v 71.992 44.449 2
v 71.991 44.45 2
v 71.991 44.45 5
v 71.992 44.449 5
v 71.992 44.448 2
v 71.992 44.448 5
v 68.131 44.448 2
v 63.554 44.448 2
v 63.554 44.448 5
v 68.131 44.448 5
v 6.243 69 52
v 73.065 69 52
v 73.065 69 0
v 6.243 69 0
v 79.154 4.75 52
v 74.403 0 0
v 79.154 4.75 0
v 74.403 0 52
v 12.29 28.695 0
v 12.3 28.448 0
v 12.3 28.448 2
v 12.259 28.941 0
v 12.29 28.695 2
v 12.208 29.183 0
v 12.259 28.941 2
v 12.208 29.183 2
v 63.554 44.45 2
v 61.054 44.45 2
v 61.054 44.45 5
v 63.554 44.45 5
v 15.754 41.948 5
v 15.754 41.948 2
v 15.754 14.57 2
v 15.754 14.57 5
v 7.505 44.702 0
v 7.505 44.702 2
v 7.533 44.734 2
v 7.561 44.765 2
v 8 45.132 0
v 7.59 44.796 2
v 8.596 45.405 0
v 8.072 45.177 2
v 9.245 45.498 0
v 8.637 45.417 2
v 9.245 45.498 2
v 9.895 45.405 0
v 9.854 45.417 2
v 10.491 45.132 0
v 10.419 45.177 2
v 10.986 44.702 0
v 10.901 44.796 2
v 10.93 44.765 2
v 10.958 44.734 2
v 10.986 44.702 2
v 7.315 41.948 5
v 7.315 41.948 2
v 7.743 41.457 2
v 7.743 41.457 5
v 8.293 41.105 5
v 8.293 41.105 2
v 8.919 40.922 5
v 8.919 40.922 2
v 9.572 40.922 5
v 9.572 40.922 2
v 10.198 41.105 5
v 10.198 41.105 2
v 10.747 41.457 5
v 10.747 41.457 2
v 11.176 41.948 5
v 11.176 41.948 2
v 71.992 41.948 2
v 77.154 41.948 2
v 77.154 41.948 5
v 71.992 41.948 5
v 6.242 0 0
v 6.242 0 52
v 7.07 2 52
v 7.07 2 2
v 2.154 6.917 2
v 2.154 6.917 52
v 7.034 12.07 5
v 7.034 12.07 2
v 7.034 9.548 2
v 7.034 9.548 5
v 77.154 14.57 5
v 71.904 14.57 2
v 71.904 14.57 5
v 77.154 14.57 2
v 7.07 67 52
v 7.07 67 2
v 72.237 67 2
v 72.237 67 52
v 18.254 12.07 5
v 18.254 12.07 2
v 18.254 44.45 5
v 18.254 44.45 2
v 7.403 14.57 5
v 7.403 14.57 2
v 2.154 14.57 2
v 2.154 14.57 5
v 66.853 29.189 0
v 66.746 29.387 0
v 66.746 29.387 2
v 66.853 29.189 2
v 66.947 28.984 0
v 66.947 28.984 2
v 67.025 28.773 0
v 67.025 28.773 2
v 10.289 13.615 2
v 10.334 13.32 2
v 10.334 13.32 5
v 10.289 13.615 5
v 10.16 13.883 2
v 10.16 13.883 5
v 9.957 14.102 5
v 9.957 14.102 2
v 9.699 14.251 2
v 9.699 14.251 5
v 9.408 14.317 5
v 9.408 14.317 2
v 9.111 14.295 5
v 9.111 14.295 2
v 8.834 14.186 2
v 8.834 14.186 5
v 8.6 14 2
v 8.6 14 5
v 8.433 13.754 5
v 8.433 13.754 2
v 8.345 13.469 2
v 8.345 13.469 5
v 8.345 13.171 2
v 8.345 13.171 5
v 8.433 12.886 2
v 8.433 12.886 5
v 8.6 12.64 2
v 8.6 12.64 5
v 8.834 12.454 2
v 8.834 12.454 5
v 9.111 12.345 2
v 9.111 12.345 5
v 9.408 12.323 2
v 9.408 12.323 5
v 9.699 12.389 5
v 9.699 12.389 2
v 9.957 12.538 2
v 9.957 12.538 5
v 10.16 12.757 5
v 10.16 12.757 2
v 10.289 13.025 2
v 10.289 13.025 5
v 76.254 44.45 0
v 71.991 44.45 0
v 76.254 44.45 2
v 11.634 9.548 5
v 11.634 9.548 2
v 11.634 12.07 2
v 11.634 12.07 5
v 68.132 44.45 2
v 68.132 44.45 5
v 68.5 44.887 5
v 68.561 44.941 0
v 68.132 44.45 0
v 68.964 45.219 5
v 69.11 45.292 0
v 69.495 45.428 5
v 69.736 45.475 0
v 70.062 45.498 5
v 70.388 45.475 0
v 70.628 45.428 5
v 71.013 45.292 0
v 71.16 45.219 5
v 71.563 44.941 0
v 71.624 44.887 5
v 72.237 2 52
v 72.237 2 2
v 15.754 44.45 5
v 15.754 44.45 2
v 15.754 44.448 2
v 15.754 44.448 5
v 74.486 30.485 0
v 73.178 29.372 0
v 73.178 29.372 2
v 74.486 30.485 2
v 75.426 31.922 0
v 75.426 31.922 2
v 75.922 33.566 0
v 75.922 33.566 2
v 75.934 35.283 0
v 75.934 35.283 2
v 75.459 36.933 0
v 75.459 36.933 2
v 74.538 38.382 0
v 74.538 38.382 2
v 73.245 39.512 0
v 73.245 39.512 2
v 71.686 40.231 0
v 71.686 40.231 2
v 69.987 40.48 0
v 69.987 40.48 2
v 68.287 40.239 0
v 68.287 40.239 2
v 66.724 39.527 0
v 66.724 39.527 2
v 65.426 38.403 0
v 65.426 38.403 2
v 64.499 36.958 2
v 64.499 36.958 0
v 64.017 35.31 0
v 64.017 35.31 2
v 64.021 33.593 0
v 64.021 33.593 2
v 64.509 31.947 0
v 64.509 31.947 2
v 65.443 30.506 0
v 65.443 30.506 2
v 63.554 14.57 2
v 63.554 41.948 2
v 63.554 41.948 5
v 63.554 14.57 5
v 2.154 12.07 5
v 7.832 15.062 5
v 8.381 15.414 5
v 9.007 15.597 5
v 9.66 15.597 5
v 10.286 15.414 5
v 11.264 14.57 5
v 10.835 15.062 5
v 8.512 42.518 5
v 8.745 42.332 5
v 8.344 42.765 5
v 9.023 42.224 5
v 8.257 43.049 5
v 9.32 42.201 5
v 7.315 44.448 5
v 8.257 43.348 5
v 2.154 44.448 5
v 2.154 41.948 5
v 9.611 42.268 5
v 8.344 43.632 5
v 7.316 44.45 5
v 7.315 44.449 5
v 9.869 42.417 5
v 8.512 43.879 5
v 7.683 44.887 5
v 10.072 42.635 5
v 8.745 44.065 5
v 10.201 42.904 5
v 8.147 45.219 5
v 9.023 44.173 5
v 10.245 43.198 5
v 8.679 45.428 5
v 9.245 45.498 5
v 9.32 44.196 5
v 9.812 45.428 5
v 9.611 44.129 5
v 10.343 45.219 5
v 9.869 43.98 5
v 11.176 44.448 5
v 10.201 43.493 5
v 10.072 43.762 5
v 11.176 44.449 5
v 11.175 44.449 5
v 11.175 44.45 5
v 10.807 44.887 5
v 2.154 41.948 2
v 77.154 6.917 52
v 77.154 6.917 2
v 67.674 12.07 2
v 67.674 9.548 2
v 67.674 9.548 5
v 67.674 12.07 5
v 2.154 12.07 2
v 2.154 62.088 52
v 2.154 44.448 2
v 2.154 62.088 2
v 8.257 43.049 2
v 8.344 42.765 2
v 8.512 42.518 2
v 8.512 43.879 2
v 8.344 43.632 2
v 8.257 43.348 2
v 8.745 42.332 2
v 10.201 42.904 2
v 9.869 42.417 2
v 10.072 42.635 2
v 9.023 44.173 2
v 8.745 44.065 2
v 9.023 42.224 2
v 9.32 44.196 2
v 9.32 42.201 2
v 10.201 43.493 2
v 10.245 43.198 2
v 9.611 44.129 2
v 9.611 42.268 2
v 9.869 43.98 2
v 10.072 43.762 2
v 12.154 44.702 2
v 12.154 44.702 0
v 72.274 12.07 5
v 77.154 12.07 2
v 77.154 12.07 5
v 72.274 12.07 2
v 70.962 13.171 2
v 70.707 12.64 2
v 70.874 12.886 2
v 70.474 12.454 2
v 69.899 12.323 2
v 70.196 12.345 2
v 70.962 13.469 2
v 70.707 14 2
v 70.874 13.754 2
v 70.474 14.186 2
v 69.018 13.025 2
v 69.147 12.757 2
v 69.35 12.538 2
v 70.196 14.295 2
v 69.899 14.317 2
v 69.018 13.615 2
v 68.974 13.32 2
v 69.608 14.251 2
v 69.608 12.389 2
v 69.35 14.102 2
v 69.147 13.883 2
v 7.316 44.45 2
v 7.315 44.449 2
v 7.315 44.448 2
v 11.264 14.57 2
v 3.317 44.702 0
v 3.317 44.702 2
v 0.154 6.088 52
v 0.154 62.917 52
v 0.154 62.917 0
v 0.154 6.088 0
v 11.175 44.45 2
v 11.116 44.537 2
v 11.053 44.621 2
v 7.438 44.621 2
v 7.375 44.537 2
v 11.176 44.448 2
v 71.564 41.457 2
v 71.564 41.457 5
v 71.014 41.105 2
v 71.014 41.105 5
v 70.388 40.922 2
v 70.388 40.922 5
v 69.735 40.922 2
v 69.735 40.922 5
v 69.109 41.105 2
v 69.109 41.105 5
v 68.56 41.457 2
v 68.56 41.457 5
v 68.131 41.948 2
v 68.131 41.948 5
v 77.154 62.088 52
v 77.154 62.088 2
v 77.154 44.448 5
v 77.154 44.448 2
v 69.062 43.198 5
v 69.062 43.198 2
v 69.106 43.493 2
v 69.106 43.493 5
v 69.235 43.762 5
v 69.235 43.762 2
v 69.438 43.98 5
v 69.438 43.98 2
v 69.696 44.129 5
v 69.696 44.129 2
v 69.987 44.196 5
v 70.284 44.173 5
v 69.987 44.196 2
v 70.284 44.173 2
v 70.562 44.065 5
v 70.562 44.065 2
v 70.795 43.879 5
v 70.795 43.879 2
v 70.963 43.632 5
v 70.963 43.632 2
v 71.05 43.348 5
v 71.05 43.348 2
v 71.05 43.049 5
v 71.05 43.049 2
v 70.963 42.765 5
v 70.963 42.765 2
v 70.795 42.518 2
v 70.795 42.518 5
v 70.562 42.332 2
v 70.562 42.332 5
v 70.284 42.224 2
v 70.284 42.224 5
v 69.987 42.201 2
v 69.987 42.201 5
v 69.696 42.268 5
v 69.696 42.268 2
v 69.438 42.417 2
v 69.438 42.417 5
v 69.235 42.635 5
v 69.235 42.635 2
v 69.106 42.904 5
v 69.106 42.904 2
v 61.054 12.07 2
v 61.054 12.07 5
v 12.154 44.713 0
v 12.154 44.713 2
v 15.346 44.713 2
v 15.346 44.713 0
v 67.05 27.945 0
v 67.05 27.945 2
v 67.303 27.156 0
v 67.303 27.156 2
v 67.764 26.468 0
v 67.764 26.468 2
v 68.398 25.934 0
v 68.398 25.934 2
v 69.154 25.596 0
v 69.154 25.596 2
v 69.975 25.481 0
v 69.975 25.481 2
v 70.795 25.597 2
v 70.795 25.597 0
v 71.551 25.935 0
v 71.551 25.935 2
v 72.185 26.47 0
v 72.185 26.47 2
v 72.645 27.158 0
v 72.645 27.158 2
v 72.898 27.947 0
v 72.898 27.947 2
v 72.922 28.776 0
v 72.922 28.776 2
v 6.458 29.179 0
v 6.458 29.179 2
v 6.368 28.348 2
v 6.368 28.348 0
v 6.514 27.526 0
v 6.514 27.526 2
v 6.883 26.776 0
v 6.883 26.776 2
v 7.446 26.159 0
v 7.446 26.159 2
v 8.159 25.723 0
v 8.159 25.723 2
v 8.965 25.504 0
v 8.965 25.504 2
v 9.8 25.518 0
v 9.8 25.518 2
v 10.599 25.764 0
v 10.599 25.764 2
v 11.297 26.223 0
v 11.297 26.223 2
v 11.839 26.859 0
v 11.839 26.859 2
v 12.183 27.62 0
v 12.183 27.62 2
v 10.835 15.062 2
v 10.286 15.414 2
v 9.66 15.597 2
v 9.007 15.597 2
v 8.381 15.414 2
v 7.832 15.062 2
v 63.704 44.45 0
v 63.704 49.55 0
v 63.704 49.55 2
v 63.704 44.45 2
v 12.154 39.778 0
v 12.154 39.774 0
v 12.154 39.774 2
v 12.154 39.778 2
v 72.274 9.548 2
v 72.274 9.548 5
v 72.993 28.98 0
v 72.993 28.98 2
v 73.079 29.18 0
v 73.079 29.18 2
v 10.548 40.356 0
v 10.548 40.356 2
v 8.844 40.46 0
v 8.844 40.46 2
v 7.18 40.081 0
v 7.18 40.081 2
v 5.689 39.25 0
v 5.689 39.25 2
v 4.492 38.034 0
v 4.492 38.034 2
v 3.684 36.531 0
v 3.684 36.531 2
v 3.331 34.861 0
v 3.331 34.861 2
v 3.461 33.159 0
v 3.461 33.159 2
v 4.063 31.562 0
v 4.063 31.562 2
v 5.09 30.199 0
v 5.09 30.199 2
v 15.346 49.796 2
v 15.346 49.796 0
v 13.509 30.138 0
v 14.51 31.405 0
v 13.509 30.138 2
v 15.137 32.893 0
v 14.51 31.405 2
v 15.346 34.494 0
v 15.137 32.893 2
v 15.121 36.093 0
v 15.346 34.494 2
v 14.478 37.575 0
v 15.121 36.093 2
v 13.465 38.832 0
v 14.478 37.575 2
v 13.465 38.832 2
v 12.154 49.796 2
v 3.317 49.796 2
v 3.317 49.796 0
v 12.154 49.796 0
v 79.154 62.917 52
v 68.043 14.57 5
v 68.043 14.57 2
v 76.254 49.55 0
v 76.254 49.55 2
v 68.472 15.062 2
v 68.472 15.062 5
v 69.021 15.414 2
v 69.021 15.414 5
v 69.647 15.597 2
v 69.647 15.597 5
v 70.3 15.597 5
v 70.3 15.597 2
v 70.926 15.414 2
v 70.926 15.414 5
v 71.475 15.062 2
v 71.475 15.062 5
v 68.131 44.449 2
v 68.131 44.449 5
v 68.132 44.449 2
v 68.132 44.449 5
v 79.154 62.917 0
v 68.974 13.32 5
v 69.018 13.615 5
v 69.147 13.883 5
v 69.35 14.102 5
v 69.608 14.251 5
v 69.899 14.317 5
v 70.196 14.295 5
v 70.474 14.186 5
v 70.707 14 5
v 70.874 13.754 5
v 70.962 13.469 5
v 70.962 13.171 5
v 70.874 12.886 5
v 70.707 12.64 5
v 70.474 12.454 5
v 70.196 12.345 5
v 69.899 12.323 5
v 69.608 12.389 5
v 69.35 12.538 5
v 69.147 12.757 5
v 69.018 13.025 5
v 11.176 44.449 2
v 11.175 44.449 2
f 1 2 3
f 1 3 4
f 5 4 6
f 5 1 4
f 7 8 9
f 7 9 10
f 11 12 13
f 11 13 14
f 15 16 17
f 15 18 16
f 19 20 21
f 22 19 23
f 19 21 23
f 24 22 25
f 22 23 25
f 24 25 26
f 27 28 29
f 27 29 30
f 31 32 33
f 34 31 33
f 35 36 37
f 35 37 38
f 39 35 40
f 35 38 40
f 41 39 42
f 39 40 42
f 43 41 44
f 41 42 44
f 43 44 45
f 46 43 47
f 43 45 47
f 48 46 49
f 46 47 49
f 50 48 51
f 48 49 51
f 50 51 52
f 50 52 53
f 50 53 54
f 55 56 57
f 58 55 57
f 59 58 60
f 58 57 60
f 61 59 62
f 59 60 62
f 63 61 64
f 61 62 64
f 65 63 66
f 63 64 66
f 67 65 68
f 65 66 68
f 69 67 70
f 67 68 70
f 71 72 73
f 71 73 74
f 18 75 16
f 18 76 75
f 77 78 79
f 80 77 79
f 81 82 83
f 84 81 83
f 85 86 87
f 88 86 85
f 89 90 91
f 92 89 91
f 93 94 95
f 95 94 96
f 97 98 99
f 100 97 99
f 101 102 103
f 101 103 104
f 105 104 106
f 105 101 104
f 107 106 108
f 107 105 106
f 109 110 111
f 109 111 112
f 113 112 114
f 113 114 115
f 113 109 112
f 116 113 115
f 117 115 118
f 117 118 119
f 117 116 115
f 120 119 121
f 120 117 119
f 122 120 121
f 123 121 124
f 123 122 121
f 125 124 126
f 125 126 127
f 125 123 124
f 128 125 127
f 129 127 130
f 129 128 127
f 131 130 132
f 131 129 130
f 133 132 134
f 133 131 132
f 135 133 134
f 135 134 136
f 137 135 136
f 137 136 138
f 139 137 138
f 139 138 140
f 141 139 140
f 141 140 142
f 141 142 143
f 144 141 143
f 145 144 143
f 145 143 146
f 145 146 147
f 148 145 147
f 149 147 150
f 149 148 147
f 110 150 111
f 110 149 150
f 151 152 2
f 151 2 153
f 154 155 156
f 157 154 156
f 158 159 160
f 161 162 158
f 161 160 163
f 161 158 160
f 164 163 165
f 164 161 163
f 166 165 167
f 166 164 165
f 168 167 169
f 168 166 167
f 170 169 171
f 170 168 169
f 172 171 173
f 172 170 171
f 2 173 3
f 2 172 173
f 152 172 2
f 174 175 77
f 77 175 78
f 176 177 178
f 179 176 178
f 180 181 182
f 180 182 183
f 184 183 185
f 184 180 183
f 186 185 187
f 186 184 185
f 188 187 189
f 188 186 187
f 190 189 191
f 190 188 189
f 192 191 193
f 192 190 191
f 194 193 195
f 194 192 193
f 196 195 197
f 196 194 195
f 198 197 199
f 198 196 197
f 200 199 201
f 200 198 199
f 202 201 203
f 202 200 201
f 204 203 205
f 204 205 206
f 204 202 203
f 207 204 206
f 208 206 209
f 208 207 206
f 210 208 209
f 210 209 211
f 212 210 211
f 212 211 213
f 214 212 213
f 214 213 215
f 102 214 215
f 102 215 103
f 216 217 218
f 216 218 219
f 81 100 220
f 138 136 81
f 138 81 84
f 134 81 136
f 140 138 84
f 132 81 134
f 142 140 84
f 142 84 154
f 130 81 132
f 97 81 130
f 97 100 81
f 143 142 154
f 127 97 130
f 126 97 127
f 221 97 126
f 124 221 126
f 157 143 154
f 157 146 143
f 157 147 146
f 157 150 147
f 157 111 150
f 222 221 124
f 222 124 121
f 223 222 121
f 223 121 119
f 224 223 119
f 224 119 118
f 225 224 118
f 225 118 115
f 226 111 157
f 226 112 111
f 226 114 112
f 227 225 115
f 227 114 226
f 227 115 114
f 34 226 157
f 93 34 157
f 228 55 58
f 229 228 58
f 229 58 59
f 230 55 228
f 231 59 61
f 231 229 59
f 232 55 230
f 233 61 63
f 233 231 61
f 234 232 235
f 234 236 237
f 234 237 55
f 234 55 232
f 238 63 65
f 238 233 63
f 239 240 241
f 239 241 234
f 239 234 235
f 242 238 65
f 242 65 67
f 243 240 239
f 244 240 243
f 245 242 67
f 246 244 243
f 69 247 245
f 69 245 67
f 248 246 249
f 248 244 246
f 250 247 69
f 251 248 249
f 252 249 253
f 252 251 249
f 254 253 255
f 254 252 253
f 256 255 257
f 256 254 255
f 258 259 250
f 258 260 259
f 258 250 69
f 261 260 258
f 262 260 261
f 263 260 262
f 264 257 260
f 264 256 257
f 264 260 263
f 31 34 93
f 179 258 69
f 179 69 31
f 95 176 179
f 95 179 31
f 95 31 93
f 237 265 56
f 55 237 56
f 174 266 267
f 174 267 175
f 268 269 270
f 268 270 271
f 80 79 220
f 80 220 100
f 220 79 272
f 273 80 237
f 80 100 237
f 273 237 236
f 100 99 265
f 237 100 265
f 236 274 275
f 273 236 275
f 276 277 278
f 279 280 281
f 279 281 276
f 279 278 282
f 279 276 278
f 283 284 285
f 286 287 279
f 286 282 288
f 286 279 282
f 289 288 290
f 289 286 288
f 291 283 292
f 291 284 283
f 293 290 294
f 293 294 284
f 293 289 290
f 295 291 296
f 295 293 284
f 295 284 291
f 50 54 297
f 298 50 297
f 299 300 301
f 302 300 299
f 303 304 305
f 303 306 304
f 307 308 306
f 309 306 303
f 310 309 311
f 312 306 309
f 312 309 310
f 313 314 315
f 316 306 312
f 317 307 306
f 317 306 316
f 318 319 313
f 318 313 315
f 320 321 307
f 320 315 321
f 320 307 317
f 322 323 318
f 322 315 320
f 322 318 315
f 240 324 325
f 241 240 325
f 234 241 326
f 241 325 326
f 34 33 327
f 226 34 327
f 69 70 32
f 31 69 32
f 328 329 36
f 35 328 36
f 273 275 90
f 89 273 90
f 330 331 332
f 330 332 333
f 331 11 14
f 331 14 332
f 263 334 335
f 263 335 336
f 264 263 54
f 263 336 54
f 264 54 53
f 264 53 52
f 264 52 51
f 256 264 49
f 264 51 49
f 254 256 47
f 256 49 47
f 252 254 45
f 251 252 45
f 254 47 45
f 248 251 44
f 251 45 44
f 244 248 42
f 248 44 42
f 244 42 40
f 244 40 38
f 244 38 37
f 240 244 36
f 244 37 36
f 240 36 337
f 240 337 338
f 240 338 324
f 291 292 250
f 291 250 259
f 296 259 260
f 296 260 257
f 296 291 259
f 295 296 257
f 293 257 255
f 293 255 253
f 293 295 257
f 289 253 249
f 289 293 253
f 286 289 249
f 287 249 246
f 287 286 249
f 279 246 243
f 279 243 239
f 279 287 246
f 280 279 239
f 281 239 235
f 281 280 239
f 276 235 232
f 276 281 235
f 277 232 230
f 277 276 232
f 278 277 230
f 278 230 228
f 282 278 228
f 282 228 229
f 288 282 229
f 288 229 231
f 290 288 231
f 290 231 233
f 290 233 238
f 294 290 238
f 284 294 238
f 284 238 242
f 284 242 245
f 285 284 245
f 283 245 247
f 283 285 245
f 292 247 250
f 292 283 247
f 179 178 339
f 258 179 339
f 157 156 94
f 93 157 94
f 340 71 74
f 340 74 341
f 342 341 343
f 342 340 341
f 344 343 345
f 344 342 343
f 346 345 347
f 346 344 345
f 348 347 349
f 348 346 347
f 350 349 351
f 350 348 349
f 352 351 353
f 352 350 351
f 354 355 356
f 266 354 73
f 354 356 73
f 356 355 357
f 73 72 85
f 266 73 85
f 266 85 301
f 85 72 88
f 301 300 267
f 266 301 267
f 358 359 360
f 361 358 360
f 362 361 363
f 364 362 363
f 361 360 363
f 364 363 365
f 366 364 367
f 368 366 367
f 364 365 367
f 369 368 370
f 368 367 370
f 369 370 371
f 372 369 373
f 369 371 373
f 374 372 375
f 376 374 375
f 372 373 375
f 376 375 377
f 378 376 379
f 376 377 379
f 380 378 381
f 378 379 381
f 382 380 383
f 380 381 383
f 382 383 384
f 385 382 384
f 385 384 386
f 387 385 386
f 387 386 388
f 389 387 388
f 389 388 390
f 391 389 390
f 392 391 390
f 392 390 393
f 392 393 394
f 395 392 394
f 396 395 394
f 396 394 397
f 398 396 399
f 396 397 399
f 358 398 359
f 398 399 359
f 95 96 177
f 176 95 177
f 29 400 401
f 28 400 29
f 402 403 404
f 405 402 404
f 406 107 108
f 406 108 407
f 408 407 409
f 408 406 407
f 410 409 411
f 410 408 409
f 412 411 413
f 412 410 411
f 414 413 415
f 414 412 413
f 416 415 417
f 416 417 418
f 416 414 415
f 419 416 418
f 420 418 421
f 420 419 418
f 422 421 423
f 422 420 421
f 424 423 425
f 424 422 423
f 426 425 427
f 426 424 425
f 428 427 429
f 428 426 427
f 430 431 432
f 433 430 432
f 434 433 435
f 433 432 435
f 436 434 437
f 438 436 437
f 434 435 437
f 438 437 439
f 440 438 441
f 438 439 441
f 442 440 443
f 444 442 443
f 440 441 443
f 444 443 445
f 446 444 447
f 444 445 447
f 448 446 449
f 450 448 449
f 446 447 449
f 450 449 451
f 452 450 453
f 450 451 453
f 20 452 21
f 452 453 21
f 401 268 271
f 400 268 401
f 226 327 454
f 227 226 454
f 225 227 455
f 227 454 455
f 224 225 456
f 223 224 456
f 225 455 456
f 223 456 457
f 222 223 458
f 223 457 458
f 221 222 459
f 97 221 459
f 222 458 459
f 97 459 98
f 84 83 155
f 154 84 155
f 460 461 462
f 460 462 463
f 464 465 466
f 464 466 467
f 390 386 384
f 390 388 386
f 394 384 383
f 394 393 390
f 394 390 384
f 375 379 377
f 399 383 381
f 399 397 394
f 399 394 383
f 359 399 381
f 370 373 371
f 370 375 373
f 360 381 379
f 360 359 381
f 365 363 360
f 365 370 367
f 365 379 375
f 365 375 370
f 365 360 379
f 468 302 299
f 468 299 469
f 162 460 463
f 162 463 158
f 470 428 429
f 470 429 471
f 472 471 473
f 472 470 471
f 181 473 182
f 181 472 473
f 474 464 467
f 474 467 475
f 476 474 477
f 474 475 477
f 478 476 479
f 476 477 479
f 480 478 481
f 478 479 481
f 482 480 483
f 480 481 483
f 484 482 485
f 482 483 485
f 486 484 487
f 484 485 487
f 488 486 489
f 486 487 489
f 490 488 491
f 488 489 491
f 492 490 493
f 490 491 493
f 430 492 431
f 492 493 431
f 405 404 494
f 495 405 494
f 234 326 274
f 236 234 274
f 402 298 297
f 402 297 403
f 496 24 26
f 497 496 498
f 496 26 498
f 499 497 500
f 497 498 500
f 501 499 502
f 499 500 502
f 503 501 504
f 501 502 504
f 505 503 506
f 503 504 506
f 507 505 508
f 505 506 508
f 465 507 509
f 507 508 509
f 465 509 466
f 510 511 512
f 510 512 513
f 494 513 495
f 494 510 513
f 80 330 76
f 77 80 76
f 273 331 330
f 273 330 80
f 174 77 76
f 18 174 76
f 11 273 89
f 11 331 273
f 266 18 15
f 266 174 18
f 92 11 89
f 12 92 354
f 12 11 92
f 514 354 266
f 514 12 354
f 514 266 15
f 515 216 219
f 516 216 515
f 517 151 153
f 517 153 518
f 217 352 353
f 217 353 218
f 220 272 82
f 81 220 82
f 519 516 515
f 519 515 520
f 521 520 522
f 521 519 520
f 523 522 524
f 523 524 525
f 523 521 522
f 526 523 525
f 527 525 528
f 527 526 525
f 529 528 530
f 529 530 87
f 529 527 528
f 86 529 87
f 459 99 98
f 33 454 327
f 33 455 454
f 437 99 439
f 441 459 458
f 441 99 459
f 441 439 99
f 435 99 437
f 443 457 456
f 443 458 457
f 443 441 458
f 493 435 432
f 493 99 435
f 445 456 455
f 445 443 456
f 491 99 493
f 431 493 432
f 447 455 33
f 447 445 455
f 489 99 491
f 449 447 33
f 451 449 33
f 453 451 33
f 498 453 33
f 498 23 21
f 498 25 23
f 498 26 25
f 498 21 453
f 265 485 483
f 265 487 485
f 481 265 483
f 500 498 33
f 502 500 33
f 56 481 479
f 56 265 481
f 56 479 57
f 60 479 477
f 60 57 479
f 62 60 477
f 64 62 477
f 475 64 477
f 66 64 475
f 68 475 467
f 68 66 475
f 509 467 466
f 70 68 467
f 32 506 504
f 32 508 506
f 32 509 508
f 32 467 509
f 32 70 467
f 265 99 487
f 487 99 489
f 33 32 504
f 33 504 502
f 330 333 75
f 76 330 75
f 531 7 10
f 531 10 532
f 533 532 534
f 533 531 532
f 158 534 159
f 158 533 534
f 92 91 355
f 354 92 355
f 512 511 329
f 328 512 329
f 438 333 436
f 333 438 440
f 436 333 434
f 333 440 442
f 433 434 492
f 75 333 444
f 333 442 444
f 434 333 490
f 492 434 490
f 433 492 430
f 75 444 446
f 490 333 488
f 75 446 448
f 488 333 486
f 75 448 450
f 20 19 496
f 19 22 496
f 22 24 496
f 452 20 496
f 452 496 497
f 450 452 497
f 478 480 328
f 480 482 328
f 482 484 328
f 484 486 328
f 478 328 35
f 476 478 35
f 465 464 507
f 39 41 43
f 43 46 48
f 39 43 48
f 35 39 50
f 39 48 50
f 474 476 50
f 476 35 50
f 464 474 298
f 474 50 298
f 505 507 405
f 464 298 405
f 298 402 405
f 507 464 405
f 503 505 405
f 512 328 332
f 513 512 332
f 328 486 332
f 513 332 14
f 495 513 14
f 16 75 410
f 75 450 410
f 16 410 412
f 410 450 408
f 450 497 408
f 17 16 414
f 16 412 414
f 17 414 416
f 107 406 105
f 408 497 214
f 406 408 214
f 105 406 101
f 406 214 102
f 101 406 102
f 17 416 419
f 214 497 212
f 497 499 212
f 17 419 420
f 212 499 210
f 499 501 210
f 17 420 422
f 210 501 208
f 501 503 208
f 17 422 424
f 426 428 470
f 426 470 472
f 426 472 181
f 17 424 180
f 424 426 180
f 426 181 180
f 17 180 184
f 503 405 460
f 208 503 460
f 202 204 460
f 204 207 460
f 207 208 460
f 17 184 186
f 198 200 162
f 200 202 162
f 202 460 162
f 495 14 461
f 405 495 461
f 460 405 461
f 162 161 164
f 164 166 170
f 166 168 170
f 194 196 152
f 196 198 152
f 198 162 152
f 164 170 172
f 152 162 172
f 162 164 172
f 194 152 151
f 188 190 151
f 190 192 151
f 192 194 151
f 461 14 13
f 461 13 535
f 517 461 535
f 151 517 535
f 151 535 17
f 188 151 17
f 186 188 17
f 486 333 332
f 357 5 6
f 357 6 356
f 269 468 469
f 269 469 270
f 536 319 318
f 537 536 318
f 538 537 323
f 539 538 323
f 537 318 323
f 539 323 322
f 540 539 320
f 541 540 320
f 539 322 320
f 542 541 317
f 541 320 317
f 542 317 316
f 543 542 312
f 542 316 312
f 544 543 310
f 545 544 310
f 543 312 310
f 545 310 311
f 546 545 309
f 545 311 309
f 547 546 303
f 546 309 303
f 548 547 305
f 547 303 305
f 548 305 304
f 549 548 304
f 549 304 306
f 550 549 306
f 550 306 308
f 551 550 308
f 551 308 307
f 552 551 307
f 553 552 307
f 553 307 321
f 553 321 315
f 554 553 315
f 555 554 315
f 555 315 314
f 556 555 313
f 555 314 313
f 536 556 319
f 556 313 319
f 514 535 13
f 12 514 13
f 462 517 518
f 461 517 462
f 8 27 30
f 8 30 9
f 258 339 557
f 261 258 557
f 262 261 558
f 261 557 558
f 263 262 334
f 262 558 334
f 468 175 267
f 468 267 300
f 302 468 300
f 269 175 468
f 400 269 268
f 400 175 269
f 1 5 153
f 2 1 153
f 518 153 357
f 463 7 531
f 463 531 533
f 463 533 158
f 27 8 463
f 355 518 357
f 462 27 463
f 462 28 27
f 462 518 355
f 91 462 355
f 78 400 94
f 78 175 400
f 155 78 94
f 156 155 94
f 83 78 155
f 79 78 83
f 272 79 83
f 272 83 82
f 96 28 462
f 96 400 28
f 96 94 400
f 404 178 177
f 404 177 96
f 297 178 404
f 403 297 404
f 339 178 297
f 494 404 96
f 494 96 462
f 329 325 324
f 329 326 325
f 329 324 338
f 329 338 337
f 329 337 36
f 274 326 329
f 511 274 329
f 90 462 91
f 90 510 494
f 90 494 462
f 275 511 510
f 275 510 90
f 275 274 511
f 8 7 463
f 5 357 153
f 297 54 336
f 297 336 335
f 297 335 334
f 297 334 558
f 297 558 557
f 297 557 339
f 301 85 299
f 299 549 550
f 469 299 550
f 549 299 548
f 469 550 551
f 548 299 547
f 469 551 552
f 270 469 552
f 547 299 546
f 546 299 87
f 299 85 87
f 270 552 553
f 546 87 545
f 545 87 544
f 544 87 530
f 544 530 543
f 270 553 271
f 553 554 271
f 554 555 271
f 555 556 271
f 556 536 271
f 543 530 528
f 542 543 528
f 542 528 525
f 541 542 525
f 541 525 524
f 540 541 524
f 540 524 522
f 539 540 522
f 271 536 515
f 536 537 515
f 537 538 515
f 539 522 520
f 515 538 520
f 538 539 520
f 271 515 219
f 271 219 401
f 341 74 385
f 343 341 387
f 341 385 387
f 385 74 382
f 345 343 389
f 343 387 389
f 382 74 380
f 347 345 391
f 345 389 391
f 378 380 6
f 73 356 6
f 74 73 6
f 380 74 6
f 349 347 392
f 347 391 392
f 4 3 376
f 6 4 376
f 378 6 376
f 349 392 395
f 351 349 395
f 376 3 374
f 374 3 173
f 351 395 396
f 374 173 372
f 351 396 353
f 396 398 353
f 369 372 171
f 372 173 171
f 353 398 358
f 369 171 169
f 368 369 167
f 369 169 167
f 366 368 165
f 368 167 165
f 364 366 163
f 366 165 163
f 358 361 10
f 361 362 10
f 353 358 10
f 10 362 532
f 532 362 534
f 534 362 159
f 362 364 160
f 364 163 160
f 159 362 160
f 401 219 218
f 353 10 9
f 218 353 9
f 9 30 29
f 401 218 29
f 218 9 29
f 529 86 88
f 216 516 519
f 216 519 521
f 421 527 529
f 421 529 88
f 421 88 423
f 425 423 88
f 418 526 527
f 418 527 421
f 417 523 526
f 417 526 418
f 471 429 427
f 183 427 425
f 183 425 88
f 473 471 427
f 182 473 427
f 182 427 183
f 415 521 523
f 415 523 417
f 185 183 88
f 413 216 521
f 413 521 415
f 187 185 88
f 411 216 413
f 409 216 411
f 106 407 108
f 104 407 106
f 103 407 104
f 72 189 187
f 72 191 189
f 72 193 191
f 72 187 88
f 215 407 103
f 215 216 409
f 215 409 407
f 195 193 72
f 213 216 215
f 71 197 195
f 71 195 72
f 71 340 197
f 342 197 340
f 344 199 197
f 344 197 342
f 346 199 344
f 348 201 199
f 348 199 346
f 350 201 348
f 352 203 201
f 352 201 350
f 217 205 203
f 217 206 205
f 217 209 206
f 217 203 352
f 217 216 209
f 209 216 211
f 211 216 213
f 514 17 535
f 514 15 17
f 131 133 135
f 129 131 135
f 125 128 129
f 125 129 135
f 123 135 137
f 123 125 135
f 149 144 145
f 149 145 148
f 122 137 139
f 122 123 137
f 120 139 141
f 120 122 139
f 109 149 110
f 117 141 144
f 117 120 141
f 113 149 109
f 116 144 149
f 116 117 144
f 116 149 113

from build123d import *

# Parameters (mm, degrees)
BOSS_EXTRUDE3_DEPTH       = 2
SKETCH7_R                 = 1
SKETCH7_W                 = 2.5
SKETCH7_H                 = 2.5
BOSS_EXTRUDE5_DEPTH       = 3
SKETCH15_R                = 6.016109345
SKETCH15_R_2              = 2.966709341
CUT_EXTRUDE5_DEPTH        = 3
CUT_EXTRUDE6_DEPTH        = 3
CUT_EXTRUDE7_DEPTH        = 10
SKETCH31_W                = 2
SKETCH31_H                = 65
BOSS_EXTRUDE8_DEPTH       = 5
SKETCH36_R                = 6.012405266
CUT_EXTRUDE11_DEPTH       = 5
SKETCH37_R                = 2.966709341
CUT_EXTRUDE12_DEPTH       = 5
SKETCH38_W                = 3.192326617
SKETCH38_H                = 5.082846429
CUT_EXTRUDE13_DEPTH       = 5
BOSS_EXTRUDE13_DEPTH      = 50
BOSS_EXTRUDE13_DEPTH_BACK = 2


with BuildPart() as part:
    # Sketch2 → Boss-Extrude3 (new body)
    with BuildSketch(Plane.XY):
        Polygon((62.078732257, 67), (7.070378023, 67), (2.153513577, 62.087886246), (2.153513577, 6.916864445), (7.070378023, 2), (62.078732257, 2), (67.153513577, 7.083274694), (67.153513577, 61.921636784), align=None)
        with BuildLine():
            ThreePointArc((12.561398281, 29.386897281), (12.405099811, 29.087669445), (12.28230409, 28.773205265))
            ThreePointArc((12.28230409, 28.773205265), (9.332354964, 25.48092154), (6.384978263, 28.775508397))
            ThreePointArc((6.384978263, 28.775508397), (6.272687262, 29.080787813), (6.128559615, 29.372390302))
            ThreePointArc((6.128559615, 29.372390302), (9.319946418, 40.479834047), (12.561398281, 29.386897281))
        make_face(mode=Mode.SUBTRACT)
        with BuildLine():
            Line((7.315683042, 44.45), (3.053513577, 44.45))
            Line((3.053513577, 44.45), (3.053513577, 49.55))
            Line((3.053513577, 49.55), (15.603513577, 49.55))
            Line((15.603513577, 49.55), (15.603513577, 44.45))
            Line((15.603513577, 44.45), (11.175073004, 44.45))
            ThreePointArc((11.175073004, 44.45), (9.245378023, 45.49849), (7.315683042, 44.45))
        make_face(mode=Mode.SUBTRACT)
    boss_extrude3 = extrude(amount=BOSS_EXTRUDE3_DEPTH)

    # Sketch7 → Boss-Extrude5 (add)
    with BuildSketch(Plane.XY.offset(2)):
        with BuildLine():
            Line((15.753513577, 14.57), (11.264187035, 14.57))
            ThreePointArc((11.264187035, 14.57), (9.333513577, 15.62), (7.40284012, 14.57))
            Line((7.40284012, 14.57), (2.153513577, 14.57))
            Line((2.153513577, 14.57), (2.153513577, 12.07))
            Line((2.153513577, 12.07), (7.033513577, 12.07))
            Line((7.033513577, 12.07), (7.40284012, 12.07))
            ThreePointArc((7.40284012, 12.07), (9.333513577, 11.02), (11.264187035, 12.07))
            Line((11.264187035, 12.07), (11.633513577, 12.07))
            Line((11.633513577, 12.07), (15.753513577, 12.07))
            Line((15.753513577, 12.07), (15.753513577, 14.57))
        make_face()
        with Locations((9.333513577, 13.32)):
            Circle(SKETCH7_R, mode=Mode.SUBTRACT)
        with BuildLine():
            Line((11.633513577, 9.547776159), (11.633513577, 12.07))
            Line((11.633513577, 12.07), (11.264187035, 12.07))
            ThreePointArc((11.264187035, 12.07), (9.333513577, 11.02), (7.40284012, 12.07))
            Line((7.40284012, 12.07), (7.033513577, 12.07))
            Line((7.033513577, 12.07), (7.033513577, 9.547776159))
            Line((7.033513577, 9.547776159), (11.633513577, 9.547776159))
        make_face()
        with Locations((17.003513577, 13.32)):
            Rectangle(SKETCH7_W, SKETCH7_H)
        with BuildLine():
            Line((15.753513577, 16.534568208), (15.753513577, 14.57))
            Line((15.753513577, 14.57), (18.253513577, 14.57))
            Line((18.253513577, 14.57), (18.253513577, 16.534568208))
            Line((18.253513577, 16.534568208), (18.253513577, 44.45))
            Line((18.253513577, 44.45), (15.753513577, 44.45))
            Line((15.753513577, 44.45), (15.753513577, 44.44849))
            Line((15.753513577, 44.44849), (11.17605148, 44.44849))
            ThreePointArc((11.17605148, 44.44849), (11.17556239, 44.449245096), (11.175073004, 44.45))
            ThreePointArc((11.175073004, 44.45), (10.343450652, 45.219439406), (9.245378023, 45.49849))
            ThreePointArc((9.245378023, 45.49849), (8.147305393, 45.219439406), (7.315683042, 44.45))
            ThreePointArc((7.315683042, 44.45), (7.315193656, 44.449245096), (7.314704565, 44.44849))
            Line((7.314704565, 44.44849), (2.153513577, 44.44849))
            Line((2.153513577, 44.44849), (2.153513577, 41.94849))
            Line((2.153513577, 41.94849), (7.314704565, 41.94849))
            ThreePointArc((7.314704565, 41.94849), (9.245378023, 40.89849), (11.17605148, 41.94849))
            Line((11.17605148, 41.94849), (15.753513577, 41.94849))
            Line((15.753513577, 41.94849), (15.753513577, 16.534568208))
        make_face()
        with Locations((9.245378023, 43.19849)):
            Circle(SKETCH7_R, mode=Mode.SUBTRACT)
    boss_extrude5 = extrude(amount=BOSS_EXTRUDE5_DEPTH)

    # Mirror4: Boss-Extrude3, Boss-Extrude5 across plane
    add(boss_extrude3.mirror(Plane.ZY.offset(-34.653513577)))
    add(boss_extrude5.mirror(Plane.ZY.offset(-34.653513577)))

    # Sketch15 → Cut-Extrude5 (cut)
    with BuildSketch(Plane.XY.offset(2)):
        with Locations((9.333513577, 34.46374)):
            Circle(SKETCH15_R)
        with Locations((9.333513577, 28.447630655)):
            Circle(SKETCH15_R_2)
    cut_extrude5 = extrude(amount=-CUT_EXTRUDE5_DEPTH, mode=Mode.SUBTRACT)

    # Sketch21 → Cut-Extrude6 (cut)
    with BuildSketch(Plane.XY.offset(2)):
        with BuildLine():
            Line((3.317404233, 44.701735967), (7.504616246, 44.701735967))
            ThreePointArc((7.504616246, 44.701735967), (9.245378023, 45.49849), (10.986139799, 44.701735967))
            Line((10.986139799, 44.701735967), (15.349622922, 44.701735967))
            Line((15.349622922, 44.701735967), (15.349622922, 49.701735967))
            Line((15.349622922, 49.701735967), (3.317404233, 49.701735967))
            Line((3.317404233, 49.701735967), (3.317404233, 44.701735967))
        make_face()
    extrude(amount=-CUT_EXTRUDE6_DEPTH, mode=Mode.SUBTRACT)

    # Mirror5: Cut-Extrude5 across plane
    add(cut_extrude5.mirror(Plane.ZY.offset(-34.653513577)), mode=Mode.SUBTRACT)

    # Sketch29 → Cut-Extrude7 (cut)
    with BuildSketch(Plane.XY.offset(2)):
        with BuildLine():
            Line((3.317404233, 44.795528635), (7.590244313, 44.795528635))
            ThreePointArc((7.590244313, 44.795528635), (9.245378023, 45.49849), (10.900511733, 44.795528635))
            Line((10.900511733, 44.795528635), (15.349622922, 44.795528635))
            Line((15.349622922, 44.795528635), (15.349622922, 49.795528635))
            Line((15.349622922, 49.795528635), (3.317404233, 49.795528635))
            Line((3.317404233, 49.795528635), (3.317404233, 44.795528635))
        make_face()
    cut_extrude7 = extrude(amount=-CUT_EXTRUDE7_DEPTH, mode=Mode.SUBTRACT)

    # Mirror9: Cut-Extrude7 across plane
    add(cut_extrude7.mirror(Plane.ZY.offset(-34.653513577)), mode=Mode.SUBTRACT)

    # SurfaceCut1
    split(bisect_by=Plane.ZY.offset(-34.653513577), keep=Keep.TOP)

    # Sketch31 → Boss-Extrude8 (add)
    with BuildSketch(Plane(origin=(34.653513577, 0, 0), x_dir=(0, 0, -1), z_dir=(1, 0, 0))):
        with Locations((-1, 34.5)):
            Rectangle(SKETCH31_W, SKETCH31_H)
    extrude(amount=BOSS_EXTRUDE8_DEPTH)

    # Mirror13: Boss-Extrude3, Boss-Extrude5 across plane
    add(boss_extrude3.mirror(Plane(origin=(39.653513577, 0, 0), x_dir=(0, 0, 1), z_dir=(1, 0, 0))))
    add(boss_extrude5.mirror(Plane(origin=(39.653513577, 0, 0), x_dir=(0, 0, 1), z_dir=(1, 0, 0))))

    # Sketch36 → Cut-Extrude11 (cut)
    with BuildSketch(Plane.XY.offset(2)):
        with Locations((9.333513577, 34.46374)):
            Circle(SKETCH36_R)
    extrude(amount=-CUT_EXTRUDE11_DEPTH, mode=Mode.SUBTRACT)

    # Sketch37 → Cut-Extrude12 (cut)
    with BuildSketch(Plane.XY.offset(2)):
        with Locations((9.333513577, 28.447630655)):
            Circle(SKETCH37_R)
    extrude(amount=-CUT_EXTRUDE12_DEPTH, mode=Mode.SUBTRACT)

    # Sketch38 → Cut-Extrude13 (cut)
    with BuildSketch(Plane.XY.offset(2)):
        with Locations((13.749676886, 47.254105421)):
            Rectangle(SKETCH38_W, SKETCH38_H)
    extrude(amount=-CUT_EXTRUDE13_DEPTH, mode=Mode.SUBTRACT)

    # Sketch40 → Boss-Extrude13 (add, two sides)
    with BuildSketch(Plane.XY.offset(2)) as boss_extrude13_sk:
        Polygon((79.153513577, 4.750459826), (79.153513577, 62.91687969), (73.064510051, 69), (6.242517104, 69), (0.153513577, 62.91687969), (0.153513577, 6.088437321), (6.241950898, 0), (74.403053751, 0), align=None)
        Polygon((7.070378023, 67), (72.236649132, 67), (77.153513577, 62.087886246), (77.153513577, 6.916864445), (72.236649132, 2), (7.070378023, 2), (2.153513577, 6.916864445), (2.153513577, 62.087886246), align=None, mode=Mode.SUBTRACT)
    extrude(amount=BOSS_EXTRUDE13_DEPTH)
    extrude(boss_extrude13_sk.sketch, amount=-BOSS_EXTRUDE13_DEPTH_BACK)


solid = part.part
